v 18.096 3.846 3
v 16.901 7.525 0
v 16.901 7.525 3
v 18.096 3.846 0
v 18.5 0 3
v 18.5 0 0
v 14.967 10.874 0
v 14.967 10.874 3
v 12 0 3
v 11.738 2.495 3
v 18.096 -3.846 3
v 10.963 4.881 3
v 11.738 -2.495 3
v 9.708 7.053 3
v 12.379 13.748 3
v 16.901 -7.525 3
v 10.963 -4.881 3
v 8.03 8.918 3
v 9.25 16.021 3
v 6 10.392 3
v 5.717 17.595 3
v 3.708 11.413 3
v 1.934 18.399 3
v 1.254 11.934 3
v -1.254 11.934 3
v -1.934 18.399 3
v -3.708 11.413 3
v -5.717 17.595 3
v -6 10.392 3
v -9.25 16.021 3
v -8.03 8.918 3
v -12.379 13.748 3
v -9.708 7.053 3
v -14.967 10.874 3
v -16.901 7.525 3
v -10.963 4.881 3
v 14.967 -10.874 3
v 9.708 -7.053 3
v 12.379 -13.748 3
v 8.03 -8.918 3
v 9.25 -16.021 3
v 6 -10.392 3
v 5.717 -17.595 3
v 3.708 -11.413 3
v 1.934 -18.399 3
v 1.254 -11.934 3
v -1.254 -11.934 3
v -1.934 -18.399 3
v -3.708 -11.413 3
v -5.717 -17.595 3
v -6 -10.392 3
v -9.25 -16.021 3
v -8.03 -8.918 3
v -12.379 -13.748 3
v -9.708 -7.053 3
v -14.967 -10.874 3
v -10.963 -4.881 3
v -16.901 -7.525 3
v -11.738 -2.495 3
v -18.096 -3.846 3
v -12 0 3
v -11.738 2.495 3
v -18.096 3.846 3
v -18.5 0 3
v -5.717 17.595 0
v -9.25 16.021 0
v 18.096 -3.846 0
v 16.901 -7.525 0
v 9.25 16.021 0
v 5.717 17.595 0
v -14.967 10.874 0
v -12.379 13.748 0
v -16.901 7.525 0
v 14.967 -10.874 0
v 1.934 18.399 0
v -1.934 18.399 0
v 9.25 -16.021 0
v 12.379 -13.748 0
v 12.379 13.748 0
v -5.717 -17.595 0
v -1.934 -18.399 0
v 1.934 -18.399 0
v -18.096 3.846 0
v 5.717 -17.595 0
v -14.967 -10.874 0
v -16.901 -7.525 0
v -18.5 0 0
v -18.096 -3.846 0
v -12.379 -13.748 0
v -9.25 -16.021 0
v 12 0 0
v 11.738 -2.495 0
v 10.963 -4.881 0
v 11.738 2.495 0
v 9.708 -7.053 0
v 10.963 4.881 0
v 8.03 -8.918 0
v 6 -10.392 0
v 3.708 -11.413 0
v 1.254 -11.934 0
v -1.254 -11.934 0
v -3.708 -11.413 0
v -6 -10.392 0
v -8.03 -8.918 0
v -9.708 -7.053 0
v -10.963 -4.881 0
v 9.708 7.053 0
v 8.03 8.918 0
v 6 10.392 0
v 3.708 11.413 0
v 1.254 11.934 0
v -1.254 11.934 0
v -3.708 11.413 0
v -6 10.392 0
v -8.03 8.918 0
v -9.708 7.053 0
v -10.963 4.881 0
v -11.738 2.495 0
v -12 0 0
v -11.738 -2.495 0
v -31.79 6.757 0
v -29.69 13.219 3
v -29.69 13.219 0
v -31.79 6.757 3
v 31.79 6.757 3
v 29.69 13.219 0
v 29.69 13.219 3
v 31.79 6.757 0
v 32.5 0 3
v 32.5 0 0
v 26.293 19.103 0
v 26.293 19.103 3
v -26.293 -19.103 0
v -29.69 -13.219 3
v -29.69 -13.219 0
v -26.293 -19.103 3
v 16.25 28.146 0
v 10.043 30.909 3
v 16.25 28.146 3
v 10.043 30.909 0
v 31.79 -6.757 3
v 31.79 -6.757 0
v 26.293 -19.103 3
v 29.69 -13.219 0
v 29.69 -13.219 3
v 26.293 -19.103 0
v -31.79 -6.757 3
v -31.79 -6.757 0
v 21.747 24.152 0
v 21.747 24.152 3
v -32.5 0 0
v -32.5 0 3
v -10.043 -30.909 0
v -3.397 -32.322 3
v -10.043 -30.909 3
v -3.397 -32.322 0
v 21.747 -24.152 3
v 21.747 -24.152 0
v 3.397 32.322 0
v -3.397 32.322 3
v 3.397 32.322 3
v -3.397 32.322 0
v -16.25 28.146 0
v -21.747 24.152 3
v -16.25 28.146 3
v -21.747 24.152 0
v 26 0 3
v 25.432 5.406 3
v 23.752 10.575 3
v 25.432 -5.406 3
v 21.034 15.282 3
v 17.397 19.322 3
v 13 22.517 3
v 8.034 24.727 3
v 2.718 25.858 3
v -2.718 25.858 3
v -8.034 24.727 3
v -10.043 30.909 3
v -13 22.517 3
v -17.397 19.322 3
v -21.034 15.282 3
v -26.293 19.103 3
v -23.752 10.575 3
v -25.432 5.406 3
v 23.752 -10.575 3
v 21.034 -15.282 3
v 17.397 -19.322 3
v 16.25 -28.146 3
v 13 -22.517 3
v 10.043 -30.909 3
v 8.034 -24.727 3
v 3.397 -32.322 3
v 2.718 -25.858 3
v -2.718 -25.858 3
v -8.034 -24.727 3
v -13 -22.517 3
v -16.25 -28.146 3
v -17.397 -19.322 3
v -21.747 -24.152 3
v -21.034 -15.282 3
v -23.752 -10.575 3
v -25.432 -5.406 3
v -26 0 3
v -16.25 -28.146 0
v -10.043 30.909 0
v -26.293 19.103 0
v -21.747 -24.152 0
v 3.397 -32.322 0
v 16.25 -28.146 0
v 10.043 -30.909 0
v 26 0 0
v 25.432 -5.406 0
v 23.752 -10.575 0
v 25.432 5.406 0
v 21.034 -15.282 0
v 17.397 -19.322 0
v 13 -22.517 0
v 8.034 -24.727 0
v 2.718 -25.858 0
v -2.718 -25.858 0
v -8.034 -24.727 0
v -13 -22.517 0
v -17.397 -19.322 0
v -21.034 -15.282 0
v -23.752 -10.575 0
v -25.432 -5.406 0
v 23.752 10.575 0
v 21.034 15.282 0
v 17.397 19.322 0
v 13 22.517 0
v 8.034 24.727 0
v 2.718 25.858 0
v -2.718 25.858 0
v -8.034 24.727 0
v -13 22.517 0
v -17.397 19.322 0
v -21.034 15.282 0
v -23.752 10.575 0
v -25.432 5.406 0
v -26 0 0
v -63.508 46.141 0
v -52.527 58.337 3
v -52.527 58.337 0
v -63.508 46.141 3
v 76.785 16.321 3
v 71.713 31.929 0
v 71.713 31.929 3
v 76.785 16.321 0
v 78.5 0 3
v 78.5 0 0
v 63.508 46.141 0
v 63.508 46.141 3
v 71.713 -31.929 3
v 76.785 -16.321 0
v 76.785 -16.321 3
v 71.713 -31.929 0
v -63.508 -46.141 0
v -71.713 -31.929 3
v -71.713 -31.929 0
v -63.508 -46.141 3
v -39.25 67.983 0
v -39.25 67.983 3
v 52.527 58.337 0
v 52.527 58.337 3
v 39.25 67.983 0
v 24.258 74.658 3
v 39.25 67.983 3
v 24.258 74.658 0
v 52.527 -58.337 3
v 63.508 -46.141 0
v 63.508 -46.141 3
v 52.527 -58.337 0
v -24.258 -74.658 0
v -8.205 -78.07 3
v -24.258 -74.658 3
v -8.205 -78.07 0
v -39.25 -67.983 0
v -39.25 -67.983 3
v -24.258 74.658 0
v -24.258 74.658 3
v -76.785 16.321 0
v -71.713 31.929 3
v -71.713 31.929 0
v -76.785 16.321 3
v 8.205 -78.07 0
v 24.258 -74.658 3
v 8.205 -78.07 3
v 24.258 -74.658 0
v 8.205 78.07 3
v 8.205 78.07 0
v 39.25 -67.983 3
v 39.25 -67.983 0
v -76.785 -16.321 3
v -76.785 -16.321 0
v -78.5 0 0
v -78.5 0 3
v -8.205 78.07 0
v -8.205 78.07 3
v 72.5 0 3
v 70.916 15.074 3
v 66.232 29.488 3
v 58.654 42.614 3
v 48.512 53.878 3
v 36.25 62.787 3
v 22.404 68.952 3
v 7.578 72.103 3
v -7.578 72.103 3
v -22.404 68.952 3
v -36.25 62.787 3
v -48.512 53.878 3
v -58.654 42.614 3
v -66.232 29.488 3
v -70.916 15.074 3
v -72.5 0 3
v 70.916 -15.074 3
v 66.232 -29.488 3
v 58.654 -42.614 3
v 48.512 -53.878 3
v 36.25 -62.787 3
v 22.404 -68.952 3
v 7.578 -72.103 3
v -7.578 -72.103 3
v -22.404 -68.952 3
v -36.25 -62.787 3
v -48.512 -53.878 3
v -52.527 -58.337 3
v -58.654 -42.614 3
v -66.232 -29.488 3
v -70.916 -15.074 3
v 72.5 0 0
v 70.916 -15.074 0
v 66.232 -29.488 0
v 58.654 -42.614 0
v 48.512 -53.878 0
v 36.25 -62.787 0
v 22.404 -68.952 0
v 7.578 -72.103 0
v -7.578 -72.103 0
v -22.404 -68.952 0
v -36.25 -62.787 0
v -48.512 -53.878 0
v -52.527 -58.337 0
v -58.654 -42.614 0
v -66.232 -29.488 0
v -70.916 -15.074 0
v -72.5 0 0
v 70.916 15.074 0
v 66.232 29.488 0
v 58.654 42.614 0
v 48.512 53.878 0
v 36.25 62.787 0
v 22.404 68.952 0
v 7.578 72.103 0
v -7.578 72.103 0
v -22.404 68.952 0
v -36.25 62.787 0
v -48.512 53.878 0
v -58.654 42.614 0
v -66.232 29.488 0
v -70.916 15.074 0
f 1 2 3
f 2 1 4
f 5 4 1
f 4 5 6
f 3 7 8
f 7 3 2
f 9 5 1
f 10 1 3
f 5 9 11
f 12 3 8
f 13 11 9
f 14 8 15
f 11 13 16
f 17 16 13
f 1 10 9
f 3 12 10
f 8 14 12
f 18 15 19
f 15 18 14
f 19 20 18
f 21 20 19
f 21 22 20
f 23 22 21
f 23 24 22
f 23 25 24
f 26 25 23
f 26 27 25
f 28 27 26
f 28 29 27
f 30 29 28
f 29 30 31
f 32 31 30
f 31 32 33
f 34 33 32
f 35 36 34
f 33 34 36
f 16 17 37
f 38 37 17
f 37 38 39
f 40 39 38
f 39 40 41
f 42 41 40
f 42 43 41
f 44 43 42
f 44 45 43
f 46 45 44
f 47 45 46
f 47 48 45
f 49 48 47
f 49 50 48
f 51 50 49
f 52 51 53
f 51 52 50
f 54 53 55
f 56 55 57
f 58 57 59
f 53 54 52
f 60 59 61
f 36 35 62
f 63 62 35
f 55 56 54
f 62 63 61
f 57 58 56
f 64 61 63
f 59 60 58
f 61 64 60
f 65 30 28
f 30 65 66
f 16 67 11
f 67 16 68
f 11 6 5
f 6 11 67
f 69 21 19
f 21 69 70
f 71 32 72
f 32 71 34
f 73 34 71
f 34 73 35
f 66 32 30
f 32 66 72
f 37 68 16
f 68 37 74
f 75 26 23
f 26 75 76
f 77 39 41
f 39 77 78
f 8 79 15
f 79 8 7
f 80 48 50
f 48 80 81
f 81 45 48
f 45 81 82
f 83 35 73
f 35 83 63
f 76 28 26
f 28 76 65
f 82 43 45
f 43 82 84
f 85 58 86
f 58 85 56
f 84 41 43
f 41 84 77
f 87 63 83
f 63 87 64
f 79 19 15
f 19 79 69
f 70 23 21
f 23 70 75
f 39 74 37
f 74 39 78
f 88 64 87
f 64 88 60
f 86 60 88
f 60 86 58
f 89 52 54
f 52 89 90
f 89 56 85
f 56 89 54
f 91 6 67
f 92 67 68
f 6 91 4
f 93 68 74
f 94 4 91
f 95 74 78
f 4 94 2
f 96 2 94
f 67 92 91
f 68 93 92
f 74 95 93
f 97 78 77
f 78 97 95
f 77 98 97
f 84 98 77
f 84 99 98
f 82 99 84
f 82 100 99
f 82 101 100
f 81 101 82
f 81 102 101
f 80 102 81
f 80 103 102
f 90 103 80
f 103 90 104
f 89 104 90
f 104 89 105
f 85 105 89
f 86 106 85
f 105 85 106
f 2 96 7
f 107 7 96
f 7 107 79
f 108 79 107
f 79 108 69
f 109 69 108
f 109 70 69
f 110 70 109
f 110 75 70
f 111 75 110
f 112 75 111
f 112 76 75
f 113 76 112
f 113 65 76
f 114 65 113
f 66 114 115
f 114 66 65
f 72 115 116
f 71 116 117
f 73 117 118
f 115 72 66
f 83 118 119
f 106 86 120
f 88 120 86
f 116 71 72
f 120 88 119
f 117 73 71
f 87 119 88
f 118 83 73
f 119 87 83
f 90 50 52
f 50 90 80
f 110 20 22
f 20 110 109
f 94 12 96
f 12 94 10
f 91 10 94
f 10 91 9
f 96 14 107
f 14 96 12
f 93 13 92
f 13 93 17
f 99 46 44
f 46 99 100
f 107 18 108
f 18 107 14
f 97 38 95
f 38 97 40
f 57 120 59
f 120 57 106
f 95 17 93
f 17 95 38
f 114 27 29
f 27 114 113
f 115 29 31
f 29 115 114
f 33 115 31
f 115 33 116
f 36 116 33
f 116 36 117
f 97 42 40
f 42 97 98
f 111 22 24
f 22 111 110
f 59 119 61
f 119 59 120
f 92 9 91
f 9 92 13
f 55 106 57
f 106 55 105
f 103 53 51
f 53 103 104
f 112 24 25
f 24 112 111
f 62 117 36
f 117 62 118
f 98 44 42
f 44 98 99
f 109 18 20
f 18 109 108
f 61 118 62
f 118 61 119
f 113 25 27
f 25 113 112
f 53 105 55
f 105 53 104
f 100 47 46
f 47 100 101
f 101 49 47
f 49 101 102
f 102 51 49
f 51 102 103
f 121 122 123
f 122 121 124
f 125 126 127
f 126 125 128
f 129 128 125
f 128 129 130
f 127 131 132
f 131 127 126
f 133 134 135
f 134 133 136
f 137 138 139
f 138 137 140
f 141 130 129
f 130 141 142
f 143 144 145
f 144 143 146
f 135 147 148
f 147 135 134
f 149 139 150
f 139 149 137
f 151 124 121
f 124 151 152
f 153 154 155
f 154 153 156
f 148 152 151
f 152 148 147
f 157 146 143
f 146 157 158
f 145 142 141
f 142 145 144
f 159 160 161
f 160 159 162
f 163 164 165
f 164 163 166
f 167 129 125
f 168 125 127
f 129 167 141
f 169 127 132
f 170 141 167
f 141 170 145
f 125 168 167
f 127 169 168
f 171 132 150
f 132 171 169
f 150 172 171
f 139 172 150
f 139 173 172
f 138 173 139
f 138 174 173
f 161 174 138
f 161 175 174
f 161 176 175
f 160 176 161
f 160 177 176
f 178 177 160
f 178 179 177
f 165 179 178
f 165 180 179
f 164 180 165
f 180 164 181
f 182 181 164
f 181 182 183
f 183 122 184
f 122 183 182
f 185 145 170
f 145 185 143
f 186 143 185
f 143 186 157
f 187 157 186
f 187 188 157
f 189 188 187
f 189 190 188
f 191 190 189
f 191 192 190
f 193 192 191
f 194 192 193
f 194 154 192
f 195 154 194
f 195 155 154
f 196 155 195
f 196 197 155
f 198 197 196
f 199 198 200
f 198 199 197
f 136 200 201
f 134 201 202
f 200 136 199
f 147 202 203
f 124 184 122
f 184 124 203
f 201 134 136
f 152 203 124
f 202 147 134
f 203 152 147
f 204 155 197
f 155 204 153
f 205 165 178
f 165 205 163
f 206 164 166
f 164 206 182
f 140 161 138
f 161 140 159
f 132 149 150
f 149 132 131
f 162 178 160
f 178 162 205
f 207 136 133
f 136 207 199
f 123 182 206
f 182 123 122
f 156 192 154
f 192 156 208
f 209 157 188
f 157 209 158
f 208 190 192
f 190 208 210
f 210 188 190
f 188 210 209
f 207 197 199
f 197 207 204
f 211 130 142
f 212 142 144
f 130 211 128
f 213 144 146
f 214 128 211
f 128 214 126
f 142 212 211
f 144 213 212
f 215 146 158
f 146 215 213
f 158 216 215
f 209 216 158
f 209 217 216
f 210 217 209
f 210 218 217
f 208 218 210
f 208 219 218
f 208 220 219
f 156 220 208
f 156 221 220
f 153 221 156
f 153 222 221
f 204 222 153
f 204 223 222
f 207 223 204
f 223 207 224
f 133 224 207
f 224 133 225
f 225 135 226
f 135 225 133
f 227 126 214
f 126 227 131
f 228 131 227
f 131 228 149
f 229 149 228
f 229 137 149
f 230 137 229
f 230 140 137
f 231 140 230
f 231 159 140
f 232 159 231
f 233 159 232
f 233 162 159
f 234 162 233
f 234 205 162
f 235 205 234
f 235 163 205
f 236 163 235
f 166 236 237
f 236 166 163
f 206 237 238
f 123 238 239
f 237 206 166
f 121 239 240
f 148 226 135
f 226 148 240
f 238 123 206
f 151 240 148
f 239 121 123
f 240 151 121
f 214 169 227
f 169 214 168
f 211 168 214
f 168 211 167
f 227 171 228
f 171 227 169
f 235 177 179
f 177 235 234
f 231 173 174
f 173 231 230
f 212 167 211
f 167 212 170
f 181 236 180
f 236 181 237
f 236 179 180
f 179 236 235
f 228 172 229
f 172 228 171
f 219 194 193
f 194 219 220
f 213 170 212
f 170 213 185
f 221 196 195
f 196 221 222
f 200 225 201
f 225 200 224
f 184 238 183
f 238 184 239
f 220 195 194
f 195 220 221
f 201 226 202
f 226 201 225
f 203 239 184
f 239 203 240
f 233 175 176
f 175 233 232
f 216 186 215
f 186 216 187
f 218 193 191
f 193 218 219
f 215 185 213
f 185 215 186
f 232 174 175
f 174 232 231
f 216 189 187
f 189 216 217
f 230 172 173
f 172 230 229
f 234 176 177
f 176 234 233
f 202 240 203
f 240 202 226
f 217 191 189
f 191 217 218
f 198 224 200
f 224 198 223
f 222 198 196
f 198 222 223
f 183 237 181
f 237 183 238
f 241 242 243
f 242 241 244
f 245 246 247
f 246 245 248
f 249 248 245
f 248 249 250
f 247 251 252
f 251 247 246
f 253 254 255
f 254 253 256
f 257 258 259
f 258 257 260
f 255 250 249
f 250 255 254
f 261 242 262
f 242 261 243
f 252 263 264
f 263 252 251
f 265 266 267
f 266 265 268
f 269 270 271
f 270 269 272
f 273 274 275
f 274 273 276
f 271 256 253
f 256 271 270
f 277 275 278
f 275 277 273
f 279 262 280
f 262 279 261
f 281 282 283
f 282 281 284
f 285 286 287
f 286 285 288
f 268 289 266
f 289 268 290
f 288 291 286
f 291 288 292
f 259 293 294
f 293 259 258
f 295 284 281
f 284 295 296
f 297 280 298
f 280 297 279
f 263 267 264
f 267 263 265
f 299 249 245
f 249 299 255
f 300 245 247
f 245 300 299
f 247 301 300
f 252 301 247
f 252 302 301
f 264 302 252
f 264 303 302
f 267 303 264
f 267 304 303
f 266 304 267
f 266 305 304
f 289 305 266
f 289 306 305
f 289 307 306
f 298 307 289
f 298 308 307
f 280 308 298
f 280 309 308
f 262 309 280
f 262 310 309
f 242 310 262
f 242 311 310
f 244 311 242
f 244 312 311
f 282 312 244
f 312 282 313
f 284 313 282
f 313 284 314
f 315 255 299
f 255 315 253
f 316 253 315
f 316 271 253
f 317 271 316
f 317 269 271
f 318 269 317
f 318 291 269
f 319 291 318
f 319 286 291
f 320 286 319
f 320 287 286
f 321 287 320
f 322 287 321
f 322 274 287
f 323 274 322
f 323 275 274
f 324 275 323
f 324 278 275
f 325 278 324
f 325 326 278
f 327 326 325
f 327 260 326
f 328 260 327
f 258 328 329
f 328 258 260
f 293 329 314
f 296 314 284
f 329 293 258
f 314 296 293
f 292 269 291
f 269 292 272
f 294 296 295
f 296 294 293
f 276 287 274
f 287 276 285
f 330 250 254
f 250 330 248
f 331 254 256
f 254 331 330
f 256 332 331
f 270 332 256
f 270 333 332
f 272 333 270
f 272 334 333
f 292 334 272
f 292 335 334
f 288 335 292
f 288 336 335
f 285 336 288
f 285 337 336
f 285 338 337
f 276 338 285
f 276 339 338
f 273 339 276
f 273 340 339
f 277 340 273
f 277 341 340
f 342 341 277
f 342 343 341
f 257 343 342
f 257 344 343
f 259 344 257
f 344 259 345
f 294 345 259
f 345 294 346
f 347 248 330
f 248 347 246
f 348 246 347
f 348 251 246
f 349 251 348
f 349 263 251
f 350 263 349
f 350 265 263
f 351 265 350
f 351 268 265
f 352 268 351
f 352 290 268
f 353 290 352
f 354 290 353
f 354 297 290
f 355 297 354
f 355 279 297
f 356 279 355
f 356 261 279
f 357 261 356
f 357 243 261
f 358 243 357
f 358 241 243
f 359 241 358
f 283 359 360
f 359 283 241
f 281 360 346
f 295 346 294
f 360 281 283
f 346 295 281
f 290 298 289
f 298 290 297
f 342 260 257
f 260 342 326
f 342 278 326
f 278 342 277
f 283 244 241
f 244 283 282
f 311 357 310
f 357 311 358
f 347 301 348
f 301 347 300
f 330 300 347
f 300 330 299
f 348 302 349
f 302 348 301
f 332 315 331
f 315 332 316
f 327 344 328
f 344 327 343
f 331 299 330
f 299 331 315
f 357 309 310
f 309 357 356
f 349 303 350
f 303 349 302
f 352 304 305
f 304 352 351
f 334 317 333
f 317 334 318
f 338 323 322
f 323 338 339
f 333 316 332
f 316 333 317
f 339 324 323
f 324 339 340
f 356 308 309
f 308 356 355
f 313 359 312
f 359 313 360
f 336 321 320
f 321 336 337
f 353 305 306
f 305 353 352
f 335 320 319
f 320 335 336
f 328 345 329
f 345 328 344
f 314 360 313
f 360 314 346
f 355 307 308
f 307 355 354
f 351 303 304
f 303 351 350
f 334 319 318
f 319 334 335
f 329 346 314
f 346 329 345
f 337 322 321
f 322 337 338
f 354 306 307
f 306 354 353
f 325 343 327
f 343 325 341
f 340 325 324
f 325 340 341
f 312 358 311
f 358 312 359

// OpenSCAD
// NeoPixels Rings for the LightClock project
//
// Pierre Cauchois (pierreca)
// 5/18/2014

// LED Rings
ring_height = 3;

ring60_inner_radius = 72.5;
ring60_outer_radius = 78.5;

ring24_inner_radius = 26;
ring24_outer_radius = 32.5;

ring12_inner_radius = 12;
ring12_outer_radius = 18.5;

module led_ring(inner_radius, outer_radius) {
	difference() {
		cylinder(h=ring_height, r=outer_radius);
		cylinder(h=ring_height, r=inner_radius);
	}
}

module neopixels_ring_12(x, y, z) {
	translate([x, y, z]) {
		led_ring(ring12_inner_radius, ring12_outer_radius);
	}
}

module neopixels_ring_24(x, y, z) {
	translate([x, y, z]) {
		led_ring(ring24_inner_radius, ring24_outer_radius);
	}
}

module neopixels_ring_60(x, y, z) {
	translate([x, y, z]) {
		led_ring(ring60_inner_radius, ring60_outer_radius);
	}
}

neopixels_ring_12(0, 0, 0);
neopixels_ring_24(0, 0, 0);
neopixels_ring_60(0, 0, 0);
